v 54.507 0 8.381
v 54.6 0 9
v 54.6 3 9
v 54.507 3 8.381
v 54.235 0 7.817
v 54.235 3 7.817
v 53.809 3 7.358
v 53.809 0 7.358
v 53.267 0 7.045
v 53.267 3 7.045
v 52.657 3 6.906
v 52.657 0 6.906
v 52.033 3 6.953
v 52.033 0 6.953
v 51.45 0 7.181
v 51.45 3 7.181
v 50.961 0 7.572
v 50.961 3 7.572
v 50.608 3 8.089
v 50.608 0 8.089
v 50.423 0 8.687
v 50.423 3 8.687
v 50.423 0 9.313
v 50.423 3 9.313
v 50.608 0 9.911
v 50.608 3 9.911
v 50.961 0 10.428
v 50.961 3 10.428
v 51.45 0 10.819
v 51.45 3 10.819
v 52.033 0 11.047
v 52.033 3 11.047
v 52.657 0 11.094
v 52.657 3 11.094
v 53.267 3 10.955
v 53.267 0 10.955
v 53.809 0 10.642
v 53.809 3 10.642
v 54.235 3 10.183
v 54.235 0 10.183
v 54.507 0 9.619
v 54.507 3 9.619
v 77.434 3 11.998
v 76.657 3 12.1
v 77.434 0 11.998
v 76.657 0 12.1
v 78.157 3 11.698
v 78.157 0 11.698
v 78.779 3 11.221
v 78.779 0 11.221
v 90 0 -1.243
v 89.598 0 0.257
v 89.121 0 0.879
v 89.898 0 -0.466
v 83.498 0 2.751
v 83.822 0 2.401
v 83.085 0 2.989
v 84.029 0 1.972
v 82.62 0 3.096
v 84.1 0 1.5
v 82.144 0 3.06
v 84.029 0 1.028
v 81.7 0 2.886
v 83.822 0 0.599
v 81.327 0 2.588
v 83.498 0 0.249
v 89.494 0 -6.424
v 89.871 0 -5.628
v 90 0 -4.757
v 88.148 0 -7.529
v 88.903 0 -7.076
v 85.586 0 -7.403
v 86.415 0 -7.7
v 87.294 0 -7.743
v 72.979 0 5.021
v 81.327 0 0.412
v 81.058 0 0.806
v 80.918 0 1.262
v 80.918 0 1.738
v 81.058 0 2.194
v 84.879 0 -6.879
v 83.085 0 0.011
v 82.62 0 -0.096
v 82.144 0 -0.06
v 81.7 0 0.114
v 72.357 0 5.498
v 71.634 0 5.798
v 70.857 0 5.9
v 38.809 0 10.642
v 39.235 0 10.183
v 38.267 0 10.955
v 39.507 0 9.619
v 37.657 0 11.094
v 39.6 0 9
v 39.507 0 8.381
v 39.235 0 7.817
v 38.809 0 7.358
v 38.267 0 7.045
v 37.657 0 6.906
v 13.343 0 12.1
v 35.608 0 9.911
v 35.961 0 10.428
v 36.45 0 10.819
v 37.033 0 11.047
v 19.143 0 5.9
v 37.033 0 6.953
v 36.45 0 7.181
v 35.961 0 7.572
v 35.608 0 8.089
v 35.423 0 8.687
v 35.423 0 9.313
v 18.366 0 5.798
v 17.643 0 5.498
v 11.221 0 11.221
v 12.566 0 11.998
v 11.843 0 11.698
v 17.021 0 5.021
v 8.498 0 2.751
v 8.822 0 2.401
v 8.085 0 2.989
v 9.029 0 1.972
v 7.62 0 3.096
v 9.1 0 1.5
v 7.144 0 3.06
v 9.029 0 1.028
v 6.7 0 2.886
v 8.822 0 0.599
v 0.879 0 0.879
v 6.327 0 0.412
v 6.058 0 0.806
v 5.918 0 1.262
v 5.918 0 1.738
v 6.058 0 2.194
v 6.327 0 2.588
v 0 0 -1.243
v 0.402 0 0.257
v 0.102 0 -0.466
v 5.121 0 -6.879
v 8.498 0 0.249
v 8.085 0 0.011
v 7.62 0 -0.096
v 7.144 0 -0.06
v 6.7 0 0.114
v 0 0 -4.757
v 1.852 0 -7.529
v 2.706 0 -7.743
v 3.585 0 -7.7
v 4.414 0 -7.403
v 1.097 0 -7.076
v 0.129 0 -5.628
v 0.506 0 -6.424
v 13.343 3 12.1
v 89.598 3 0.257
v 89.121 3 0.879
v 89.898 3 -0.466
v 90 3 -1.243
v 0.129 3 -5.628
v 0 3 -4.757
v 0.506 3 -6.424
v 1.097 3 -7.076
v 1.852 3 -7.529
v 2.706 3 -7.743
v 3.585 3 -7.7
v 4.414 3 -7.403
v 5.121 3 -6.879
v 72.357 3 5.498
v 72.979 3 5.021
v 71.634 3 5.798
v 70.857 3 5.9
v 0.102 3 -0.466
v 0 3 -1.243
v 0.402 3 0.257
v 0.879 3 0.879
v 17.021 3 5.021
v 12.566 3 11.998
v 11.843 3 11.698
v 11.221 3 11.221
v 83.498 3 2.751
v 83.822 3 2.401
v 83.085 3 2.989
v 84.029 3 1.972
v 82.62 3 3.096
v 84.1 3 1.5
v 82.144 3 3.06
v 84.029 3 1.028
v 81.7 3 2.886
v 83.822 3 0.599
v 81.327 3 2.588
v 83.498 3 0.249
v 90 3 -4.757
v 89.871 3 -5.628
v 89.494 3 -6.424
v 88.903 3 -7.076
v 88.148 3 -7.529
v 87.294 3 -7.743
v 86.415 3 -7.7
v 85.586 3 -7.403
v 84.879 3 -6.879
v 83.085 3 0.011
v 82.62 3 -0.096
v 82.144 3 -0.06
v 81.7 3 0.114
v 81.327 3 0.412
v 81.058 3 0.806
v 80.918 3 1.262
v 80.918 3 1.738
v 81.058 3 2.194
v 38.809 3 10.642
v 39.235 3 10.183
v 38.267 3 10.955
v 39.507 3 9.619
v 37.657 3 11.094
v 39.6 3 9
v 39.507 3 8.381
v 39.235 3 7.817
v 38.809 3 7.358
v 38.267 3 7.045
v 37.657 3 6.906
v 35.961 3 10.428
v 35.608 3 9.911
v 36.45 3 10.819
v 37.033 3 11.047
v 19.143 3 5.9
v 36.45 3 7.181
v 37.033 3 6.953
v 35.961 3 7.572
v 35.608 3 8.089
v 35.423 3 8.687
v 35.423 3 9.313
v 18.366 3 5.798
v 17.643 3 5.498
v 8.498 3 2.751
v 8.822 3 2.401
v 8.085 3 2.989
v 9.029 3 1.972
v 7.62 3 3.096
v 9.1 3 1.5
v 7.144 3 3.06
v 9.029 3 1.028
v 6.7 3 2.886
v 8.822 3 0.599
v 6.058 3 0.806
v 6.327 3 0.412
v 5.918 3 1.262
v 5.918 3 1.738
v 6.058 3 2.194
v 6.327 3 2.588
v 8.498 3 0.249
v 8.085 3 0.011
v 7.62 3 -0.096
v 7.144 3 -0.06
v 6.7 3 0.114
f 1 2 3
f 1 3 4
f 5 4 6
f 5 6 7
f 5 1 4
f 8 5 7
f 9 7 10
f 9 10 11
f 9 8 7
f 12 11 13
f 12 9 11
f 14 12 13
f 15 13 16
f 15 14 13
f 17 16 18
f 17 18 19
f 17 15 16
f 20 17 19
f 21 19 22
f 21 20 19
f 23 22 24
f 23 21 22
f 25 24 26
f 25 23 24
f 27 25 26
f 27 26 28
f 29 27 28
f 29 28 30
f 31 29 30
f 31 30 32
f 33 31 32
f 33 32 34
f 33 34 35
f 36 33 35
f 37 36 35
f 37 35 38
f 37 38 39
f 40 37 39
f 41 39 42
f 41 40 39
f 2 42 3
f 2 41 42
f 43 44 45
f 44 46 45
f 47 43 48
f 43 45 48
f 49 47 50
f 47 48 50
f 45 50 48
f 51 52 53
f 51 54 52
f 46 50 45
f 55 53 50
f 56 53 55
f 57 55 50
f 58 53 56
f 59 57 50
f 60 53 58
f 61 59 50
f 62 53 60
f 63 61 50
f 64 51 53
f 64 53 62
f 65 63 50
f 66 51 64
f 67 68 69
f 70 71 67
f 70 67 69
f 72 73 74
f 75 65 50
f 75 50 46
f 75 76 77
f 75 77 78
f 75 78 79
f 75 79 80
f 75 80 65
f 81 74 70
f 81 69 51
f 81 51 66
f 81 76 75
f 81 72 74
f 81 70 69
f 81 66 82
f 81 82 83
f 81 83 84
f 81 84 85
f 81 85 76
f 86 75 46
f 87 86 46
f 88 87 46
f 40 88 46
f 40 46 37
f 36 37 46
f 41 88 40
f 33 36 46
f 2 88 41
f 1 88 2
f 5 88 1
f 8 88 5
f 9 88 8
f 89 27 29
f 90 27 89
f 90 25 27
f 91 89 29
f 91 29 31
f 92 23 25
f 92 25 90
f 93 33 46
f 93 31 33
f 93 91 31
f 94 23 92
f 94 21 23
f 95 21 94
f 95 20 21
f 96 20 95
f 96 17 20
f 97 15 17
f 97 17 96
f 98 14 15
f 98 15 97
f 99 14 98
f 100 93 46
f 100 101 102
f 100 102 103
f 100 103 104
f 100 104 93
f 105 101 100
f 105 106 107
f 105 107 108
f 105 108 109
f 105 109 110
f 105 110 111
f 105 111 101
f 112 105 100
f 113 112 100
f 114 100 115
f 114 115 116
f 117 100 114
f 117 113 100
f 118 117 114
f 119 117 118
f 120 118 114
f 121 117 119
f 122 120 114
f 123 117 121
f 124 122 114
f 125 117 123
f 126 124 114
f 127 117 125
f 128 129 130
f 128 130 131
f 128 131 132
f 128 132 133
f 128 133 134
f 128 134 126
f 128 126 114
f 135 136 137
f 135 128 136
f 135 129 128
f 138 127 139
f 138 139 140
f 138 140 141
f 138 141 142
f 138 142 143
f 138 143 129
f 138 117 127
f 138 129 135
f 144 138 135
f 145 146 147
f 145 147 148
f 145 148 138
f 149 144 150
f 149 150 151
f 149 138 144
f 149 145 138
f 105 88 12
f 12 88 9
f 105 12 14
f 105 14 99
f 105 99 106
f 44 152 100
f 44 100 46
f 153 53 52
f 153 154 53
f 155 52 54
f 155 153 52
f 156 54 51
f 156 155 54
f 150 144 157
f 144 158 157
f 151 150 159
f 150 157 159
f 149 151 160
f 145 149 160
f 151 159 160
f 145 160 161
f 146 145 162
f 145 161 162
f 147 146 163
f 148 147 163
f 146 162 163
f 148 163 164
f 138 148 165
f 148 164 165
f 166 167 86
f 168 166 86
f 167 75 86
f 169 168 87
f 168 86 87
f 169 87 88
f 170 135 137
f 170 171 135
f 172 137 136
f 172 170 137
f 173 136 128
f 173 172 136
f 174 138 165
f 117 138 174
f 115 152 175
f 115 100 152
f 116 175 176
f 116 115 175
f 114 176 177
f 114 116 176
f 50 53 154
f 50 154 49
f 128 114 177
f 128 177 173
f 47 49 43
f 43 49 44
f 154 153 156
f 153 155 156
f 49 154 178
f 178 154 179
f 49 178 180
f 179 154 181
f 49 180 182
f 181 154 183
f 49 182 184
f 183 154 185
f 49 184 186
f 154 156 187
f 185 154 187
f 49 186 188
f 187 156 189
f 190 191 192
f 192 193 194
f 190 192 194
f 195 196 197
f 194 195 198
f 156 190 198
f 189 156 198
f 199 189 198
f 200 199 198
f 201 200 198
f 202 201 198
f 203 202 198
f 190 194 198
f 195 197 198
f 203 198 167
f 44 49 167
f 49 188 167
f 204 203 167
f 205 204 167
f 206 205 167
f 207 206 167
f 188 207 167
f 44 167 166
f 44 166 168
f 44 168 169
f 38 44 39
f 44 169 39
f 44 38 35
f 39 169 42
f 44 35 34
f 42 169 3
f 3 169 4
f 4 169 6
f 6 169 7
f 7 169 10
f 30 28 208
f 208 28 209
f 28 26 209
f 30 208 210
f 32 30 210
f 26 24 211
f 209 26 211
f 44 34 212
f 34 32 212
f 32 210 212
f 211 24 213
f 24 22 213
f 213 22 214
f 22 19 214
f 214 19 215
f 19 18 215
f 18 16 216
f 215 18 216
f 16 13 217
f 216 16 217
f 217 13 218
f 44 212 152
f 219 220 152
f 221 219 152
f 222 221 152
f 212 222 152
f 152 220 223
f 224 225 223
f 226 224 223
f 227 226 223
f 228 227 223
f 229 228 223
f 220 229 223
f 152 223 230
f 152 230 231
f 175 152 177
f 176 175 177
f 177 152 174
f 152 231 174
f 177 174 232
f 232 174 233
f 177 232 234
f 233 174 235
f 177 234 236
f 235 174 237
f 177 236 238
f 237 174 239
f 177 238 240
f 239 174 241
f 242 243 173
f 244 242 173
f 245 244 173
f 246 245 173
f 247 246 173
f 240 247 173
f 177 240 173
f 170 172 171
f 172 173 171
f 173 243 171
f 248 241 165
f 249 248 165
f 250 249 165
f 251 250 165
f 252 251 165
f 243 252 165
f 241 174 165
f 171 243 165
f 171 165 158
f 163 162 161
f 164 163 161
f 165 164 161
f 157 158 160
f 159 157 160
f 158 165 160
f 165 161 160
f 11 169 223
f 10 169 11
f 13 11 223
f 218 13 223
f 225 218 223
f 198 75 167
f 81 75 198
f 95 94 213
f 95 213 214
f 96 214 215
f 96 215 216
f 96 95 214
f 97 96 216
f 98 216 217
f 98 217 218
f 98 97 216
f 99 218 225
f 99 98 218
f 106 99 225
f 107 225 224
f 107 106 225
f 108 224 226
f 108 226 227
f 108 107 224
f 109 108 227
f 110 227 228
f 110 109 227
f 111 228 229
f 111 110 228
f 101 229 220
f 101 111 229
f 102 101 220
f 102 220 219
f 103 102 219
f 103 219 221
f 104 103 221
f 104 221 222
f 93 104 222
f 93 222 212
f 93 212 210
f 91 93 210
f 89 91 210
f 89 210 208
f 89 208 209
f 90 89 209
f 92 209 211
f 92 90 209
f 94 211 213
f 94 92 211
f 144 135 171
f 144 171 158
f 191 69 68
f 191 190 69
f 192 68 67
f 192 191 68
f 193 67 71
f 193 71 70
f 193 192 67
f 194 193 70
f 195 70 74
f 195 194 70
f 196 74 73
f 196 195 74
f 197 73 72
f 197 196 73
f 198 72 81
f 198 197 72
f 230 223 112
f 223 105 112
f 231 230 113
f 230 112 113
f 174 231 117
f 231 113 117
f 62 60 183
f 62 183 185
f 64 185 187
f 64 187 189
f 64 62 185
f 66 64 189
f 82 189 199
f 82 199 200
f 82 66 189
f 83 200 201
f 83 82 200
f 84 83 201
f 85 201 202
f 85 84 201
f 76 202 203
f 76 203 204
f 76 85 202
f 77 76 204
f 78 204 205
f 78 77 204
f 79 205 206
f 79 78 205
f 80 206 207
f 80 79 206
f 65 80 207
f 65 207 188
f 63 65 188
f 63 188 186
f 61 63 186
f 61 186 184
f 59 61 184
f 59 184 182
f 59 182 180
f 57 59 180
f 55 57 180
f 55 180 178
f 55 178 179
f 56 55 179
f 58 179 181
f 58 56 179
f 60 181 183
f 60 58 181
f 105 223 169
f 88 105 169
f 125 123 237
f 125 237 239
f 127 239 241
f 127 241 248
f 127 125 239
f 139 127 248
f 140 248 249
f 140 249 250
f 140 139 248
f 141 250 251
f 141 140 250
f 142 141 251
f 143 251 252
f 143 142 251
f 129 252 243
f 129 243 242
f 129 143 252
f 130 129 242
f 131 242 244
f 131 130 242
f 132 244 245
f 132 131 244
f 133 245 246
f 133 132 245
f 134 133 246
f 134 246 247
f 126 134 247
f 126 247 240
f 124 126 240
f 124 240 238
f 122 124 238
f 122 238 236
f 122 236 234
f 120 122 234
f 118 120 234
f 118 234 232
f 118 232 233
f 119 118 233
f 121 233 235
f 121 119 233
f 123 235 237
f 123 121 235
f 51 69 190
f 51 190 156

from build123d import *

# Parameters (mm, degrees)
SKETCH1_R           = 1.6
SKETCH1_R_2         = 2.1
BOSS_EXTRUDE1_DEPTH = 3
CUT_EXTRUDE1_DEPTH  = 4
FILLET1_R           = 3


with BuildPart() as part:
    # Sketch1 → Boss-Extrude1 (new body)
    with BuildSketch(Plane(origin=(0, 0, 0), x_dir=(1, 0, 0), z_dir=(0, 1, 0))):
        Polygon((0, 0), (0, 12), (15, -3), (75, -3), (90, 12), (90, 0), (75, -15), (15, -15), align=None)
        with Locations((7.5, -1.5)):
            Circle(SKETCH1_R, mode=Mode.SUBTRACT)
        with Locations((37.5, -9)):
            Circle(SKETCH1_R_2, mode=Mode.SUBTRACT)
        with Locations((82.5, -1.5)):
            Circle(SKETCH1_R, mode=Mode.SUBTRACT)
        with Locations((52.5, -9)):
            Circle(SKETCH1_R_2, mode=Mode.SUBTRACT)
    extrude(amount=BOSS_EXTRUDE1_DEPTH)

    # Sketch2 → Cut-Extrude1 (cut, through all)
    with BuildSketch(Plane(origin=(0, 3, 0), x_dir=(1, 0, 0), z_dir=(0, 1, 0))):
        Polygon((15, -3), (17.9, -5.9), (72.1, -5.9), (75, -3), align=None)
        Polygon((12.1, -12.1), (77.9, -12.1), (75, -15), (15, -15), align=None)
    extrude(amount=-CUT_EXTRUDE1_DEPTH, mode=Mode.SUBTRACT)

    # Fillet1
    fillet1_edges = [part.edges().sort_by_distance(p)[0] for p in [
        (0, 1.5, 0),
        (0, 1.5, -12),
        (90, 1.5, -12),
        (90, 1.5, 0),
        (72.1, 1.5, 5.9),
        (17.9, 1.5, 5.9),
        (12.1, 1.5, 12.1),
        (77.9, 1.5, 12.1),
    ]]
    fillet(fillet1_edges, radius=FILLET1_R)


solid = part.part
